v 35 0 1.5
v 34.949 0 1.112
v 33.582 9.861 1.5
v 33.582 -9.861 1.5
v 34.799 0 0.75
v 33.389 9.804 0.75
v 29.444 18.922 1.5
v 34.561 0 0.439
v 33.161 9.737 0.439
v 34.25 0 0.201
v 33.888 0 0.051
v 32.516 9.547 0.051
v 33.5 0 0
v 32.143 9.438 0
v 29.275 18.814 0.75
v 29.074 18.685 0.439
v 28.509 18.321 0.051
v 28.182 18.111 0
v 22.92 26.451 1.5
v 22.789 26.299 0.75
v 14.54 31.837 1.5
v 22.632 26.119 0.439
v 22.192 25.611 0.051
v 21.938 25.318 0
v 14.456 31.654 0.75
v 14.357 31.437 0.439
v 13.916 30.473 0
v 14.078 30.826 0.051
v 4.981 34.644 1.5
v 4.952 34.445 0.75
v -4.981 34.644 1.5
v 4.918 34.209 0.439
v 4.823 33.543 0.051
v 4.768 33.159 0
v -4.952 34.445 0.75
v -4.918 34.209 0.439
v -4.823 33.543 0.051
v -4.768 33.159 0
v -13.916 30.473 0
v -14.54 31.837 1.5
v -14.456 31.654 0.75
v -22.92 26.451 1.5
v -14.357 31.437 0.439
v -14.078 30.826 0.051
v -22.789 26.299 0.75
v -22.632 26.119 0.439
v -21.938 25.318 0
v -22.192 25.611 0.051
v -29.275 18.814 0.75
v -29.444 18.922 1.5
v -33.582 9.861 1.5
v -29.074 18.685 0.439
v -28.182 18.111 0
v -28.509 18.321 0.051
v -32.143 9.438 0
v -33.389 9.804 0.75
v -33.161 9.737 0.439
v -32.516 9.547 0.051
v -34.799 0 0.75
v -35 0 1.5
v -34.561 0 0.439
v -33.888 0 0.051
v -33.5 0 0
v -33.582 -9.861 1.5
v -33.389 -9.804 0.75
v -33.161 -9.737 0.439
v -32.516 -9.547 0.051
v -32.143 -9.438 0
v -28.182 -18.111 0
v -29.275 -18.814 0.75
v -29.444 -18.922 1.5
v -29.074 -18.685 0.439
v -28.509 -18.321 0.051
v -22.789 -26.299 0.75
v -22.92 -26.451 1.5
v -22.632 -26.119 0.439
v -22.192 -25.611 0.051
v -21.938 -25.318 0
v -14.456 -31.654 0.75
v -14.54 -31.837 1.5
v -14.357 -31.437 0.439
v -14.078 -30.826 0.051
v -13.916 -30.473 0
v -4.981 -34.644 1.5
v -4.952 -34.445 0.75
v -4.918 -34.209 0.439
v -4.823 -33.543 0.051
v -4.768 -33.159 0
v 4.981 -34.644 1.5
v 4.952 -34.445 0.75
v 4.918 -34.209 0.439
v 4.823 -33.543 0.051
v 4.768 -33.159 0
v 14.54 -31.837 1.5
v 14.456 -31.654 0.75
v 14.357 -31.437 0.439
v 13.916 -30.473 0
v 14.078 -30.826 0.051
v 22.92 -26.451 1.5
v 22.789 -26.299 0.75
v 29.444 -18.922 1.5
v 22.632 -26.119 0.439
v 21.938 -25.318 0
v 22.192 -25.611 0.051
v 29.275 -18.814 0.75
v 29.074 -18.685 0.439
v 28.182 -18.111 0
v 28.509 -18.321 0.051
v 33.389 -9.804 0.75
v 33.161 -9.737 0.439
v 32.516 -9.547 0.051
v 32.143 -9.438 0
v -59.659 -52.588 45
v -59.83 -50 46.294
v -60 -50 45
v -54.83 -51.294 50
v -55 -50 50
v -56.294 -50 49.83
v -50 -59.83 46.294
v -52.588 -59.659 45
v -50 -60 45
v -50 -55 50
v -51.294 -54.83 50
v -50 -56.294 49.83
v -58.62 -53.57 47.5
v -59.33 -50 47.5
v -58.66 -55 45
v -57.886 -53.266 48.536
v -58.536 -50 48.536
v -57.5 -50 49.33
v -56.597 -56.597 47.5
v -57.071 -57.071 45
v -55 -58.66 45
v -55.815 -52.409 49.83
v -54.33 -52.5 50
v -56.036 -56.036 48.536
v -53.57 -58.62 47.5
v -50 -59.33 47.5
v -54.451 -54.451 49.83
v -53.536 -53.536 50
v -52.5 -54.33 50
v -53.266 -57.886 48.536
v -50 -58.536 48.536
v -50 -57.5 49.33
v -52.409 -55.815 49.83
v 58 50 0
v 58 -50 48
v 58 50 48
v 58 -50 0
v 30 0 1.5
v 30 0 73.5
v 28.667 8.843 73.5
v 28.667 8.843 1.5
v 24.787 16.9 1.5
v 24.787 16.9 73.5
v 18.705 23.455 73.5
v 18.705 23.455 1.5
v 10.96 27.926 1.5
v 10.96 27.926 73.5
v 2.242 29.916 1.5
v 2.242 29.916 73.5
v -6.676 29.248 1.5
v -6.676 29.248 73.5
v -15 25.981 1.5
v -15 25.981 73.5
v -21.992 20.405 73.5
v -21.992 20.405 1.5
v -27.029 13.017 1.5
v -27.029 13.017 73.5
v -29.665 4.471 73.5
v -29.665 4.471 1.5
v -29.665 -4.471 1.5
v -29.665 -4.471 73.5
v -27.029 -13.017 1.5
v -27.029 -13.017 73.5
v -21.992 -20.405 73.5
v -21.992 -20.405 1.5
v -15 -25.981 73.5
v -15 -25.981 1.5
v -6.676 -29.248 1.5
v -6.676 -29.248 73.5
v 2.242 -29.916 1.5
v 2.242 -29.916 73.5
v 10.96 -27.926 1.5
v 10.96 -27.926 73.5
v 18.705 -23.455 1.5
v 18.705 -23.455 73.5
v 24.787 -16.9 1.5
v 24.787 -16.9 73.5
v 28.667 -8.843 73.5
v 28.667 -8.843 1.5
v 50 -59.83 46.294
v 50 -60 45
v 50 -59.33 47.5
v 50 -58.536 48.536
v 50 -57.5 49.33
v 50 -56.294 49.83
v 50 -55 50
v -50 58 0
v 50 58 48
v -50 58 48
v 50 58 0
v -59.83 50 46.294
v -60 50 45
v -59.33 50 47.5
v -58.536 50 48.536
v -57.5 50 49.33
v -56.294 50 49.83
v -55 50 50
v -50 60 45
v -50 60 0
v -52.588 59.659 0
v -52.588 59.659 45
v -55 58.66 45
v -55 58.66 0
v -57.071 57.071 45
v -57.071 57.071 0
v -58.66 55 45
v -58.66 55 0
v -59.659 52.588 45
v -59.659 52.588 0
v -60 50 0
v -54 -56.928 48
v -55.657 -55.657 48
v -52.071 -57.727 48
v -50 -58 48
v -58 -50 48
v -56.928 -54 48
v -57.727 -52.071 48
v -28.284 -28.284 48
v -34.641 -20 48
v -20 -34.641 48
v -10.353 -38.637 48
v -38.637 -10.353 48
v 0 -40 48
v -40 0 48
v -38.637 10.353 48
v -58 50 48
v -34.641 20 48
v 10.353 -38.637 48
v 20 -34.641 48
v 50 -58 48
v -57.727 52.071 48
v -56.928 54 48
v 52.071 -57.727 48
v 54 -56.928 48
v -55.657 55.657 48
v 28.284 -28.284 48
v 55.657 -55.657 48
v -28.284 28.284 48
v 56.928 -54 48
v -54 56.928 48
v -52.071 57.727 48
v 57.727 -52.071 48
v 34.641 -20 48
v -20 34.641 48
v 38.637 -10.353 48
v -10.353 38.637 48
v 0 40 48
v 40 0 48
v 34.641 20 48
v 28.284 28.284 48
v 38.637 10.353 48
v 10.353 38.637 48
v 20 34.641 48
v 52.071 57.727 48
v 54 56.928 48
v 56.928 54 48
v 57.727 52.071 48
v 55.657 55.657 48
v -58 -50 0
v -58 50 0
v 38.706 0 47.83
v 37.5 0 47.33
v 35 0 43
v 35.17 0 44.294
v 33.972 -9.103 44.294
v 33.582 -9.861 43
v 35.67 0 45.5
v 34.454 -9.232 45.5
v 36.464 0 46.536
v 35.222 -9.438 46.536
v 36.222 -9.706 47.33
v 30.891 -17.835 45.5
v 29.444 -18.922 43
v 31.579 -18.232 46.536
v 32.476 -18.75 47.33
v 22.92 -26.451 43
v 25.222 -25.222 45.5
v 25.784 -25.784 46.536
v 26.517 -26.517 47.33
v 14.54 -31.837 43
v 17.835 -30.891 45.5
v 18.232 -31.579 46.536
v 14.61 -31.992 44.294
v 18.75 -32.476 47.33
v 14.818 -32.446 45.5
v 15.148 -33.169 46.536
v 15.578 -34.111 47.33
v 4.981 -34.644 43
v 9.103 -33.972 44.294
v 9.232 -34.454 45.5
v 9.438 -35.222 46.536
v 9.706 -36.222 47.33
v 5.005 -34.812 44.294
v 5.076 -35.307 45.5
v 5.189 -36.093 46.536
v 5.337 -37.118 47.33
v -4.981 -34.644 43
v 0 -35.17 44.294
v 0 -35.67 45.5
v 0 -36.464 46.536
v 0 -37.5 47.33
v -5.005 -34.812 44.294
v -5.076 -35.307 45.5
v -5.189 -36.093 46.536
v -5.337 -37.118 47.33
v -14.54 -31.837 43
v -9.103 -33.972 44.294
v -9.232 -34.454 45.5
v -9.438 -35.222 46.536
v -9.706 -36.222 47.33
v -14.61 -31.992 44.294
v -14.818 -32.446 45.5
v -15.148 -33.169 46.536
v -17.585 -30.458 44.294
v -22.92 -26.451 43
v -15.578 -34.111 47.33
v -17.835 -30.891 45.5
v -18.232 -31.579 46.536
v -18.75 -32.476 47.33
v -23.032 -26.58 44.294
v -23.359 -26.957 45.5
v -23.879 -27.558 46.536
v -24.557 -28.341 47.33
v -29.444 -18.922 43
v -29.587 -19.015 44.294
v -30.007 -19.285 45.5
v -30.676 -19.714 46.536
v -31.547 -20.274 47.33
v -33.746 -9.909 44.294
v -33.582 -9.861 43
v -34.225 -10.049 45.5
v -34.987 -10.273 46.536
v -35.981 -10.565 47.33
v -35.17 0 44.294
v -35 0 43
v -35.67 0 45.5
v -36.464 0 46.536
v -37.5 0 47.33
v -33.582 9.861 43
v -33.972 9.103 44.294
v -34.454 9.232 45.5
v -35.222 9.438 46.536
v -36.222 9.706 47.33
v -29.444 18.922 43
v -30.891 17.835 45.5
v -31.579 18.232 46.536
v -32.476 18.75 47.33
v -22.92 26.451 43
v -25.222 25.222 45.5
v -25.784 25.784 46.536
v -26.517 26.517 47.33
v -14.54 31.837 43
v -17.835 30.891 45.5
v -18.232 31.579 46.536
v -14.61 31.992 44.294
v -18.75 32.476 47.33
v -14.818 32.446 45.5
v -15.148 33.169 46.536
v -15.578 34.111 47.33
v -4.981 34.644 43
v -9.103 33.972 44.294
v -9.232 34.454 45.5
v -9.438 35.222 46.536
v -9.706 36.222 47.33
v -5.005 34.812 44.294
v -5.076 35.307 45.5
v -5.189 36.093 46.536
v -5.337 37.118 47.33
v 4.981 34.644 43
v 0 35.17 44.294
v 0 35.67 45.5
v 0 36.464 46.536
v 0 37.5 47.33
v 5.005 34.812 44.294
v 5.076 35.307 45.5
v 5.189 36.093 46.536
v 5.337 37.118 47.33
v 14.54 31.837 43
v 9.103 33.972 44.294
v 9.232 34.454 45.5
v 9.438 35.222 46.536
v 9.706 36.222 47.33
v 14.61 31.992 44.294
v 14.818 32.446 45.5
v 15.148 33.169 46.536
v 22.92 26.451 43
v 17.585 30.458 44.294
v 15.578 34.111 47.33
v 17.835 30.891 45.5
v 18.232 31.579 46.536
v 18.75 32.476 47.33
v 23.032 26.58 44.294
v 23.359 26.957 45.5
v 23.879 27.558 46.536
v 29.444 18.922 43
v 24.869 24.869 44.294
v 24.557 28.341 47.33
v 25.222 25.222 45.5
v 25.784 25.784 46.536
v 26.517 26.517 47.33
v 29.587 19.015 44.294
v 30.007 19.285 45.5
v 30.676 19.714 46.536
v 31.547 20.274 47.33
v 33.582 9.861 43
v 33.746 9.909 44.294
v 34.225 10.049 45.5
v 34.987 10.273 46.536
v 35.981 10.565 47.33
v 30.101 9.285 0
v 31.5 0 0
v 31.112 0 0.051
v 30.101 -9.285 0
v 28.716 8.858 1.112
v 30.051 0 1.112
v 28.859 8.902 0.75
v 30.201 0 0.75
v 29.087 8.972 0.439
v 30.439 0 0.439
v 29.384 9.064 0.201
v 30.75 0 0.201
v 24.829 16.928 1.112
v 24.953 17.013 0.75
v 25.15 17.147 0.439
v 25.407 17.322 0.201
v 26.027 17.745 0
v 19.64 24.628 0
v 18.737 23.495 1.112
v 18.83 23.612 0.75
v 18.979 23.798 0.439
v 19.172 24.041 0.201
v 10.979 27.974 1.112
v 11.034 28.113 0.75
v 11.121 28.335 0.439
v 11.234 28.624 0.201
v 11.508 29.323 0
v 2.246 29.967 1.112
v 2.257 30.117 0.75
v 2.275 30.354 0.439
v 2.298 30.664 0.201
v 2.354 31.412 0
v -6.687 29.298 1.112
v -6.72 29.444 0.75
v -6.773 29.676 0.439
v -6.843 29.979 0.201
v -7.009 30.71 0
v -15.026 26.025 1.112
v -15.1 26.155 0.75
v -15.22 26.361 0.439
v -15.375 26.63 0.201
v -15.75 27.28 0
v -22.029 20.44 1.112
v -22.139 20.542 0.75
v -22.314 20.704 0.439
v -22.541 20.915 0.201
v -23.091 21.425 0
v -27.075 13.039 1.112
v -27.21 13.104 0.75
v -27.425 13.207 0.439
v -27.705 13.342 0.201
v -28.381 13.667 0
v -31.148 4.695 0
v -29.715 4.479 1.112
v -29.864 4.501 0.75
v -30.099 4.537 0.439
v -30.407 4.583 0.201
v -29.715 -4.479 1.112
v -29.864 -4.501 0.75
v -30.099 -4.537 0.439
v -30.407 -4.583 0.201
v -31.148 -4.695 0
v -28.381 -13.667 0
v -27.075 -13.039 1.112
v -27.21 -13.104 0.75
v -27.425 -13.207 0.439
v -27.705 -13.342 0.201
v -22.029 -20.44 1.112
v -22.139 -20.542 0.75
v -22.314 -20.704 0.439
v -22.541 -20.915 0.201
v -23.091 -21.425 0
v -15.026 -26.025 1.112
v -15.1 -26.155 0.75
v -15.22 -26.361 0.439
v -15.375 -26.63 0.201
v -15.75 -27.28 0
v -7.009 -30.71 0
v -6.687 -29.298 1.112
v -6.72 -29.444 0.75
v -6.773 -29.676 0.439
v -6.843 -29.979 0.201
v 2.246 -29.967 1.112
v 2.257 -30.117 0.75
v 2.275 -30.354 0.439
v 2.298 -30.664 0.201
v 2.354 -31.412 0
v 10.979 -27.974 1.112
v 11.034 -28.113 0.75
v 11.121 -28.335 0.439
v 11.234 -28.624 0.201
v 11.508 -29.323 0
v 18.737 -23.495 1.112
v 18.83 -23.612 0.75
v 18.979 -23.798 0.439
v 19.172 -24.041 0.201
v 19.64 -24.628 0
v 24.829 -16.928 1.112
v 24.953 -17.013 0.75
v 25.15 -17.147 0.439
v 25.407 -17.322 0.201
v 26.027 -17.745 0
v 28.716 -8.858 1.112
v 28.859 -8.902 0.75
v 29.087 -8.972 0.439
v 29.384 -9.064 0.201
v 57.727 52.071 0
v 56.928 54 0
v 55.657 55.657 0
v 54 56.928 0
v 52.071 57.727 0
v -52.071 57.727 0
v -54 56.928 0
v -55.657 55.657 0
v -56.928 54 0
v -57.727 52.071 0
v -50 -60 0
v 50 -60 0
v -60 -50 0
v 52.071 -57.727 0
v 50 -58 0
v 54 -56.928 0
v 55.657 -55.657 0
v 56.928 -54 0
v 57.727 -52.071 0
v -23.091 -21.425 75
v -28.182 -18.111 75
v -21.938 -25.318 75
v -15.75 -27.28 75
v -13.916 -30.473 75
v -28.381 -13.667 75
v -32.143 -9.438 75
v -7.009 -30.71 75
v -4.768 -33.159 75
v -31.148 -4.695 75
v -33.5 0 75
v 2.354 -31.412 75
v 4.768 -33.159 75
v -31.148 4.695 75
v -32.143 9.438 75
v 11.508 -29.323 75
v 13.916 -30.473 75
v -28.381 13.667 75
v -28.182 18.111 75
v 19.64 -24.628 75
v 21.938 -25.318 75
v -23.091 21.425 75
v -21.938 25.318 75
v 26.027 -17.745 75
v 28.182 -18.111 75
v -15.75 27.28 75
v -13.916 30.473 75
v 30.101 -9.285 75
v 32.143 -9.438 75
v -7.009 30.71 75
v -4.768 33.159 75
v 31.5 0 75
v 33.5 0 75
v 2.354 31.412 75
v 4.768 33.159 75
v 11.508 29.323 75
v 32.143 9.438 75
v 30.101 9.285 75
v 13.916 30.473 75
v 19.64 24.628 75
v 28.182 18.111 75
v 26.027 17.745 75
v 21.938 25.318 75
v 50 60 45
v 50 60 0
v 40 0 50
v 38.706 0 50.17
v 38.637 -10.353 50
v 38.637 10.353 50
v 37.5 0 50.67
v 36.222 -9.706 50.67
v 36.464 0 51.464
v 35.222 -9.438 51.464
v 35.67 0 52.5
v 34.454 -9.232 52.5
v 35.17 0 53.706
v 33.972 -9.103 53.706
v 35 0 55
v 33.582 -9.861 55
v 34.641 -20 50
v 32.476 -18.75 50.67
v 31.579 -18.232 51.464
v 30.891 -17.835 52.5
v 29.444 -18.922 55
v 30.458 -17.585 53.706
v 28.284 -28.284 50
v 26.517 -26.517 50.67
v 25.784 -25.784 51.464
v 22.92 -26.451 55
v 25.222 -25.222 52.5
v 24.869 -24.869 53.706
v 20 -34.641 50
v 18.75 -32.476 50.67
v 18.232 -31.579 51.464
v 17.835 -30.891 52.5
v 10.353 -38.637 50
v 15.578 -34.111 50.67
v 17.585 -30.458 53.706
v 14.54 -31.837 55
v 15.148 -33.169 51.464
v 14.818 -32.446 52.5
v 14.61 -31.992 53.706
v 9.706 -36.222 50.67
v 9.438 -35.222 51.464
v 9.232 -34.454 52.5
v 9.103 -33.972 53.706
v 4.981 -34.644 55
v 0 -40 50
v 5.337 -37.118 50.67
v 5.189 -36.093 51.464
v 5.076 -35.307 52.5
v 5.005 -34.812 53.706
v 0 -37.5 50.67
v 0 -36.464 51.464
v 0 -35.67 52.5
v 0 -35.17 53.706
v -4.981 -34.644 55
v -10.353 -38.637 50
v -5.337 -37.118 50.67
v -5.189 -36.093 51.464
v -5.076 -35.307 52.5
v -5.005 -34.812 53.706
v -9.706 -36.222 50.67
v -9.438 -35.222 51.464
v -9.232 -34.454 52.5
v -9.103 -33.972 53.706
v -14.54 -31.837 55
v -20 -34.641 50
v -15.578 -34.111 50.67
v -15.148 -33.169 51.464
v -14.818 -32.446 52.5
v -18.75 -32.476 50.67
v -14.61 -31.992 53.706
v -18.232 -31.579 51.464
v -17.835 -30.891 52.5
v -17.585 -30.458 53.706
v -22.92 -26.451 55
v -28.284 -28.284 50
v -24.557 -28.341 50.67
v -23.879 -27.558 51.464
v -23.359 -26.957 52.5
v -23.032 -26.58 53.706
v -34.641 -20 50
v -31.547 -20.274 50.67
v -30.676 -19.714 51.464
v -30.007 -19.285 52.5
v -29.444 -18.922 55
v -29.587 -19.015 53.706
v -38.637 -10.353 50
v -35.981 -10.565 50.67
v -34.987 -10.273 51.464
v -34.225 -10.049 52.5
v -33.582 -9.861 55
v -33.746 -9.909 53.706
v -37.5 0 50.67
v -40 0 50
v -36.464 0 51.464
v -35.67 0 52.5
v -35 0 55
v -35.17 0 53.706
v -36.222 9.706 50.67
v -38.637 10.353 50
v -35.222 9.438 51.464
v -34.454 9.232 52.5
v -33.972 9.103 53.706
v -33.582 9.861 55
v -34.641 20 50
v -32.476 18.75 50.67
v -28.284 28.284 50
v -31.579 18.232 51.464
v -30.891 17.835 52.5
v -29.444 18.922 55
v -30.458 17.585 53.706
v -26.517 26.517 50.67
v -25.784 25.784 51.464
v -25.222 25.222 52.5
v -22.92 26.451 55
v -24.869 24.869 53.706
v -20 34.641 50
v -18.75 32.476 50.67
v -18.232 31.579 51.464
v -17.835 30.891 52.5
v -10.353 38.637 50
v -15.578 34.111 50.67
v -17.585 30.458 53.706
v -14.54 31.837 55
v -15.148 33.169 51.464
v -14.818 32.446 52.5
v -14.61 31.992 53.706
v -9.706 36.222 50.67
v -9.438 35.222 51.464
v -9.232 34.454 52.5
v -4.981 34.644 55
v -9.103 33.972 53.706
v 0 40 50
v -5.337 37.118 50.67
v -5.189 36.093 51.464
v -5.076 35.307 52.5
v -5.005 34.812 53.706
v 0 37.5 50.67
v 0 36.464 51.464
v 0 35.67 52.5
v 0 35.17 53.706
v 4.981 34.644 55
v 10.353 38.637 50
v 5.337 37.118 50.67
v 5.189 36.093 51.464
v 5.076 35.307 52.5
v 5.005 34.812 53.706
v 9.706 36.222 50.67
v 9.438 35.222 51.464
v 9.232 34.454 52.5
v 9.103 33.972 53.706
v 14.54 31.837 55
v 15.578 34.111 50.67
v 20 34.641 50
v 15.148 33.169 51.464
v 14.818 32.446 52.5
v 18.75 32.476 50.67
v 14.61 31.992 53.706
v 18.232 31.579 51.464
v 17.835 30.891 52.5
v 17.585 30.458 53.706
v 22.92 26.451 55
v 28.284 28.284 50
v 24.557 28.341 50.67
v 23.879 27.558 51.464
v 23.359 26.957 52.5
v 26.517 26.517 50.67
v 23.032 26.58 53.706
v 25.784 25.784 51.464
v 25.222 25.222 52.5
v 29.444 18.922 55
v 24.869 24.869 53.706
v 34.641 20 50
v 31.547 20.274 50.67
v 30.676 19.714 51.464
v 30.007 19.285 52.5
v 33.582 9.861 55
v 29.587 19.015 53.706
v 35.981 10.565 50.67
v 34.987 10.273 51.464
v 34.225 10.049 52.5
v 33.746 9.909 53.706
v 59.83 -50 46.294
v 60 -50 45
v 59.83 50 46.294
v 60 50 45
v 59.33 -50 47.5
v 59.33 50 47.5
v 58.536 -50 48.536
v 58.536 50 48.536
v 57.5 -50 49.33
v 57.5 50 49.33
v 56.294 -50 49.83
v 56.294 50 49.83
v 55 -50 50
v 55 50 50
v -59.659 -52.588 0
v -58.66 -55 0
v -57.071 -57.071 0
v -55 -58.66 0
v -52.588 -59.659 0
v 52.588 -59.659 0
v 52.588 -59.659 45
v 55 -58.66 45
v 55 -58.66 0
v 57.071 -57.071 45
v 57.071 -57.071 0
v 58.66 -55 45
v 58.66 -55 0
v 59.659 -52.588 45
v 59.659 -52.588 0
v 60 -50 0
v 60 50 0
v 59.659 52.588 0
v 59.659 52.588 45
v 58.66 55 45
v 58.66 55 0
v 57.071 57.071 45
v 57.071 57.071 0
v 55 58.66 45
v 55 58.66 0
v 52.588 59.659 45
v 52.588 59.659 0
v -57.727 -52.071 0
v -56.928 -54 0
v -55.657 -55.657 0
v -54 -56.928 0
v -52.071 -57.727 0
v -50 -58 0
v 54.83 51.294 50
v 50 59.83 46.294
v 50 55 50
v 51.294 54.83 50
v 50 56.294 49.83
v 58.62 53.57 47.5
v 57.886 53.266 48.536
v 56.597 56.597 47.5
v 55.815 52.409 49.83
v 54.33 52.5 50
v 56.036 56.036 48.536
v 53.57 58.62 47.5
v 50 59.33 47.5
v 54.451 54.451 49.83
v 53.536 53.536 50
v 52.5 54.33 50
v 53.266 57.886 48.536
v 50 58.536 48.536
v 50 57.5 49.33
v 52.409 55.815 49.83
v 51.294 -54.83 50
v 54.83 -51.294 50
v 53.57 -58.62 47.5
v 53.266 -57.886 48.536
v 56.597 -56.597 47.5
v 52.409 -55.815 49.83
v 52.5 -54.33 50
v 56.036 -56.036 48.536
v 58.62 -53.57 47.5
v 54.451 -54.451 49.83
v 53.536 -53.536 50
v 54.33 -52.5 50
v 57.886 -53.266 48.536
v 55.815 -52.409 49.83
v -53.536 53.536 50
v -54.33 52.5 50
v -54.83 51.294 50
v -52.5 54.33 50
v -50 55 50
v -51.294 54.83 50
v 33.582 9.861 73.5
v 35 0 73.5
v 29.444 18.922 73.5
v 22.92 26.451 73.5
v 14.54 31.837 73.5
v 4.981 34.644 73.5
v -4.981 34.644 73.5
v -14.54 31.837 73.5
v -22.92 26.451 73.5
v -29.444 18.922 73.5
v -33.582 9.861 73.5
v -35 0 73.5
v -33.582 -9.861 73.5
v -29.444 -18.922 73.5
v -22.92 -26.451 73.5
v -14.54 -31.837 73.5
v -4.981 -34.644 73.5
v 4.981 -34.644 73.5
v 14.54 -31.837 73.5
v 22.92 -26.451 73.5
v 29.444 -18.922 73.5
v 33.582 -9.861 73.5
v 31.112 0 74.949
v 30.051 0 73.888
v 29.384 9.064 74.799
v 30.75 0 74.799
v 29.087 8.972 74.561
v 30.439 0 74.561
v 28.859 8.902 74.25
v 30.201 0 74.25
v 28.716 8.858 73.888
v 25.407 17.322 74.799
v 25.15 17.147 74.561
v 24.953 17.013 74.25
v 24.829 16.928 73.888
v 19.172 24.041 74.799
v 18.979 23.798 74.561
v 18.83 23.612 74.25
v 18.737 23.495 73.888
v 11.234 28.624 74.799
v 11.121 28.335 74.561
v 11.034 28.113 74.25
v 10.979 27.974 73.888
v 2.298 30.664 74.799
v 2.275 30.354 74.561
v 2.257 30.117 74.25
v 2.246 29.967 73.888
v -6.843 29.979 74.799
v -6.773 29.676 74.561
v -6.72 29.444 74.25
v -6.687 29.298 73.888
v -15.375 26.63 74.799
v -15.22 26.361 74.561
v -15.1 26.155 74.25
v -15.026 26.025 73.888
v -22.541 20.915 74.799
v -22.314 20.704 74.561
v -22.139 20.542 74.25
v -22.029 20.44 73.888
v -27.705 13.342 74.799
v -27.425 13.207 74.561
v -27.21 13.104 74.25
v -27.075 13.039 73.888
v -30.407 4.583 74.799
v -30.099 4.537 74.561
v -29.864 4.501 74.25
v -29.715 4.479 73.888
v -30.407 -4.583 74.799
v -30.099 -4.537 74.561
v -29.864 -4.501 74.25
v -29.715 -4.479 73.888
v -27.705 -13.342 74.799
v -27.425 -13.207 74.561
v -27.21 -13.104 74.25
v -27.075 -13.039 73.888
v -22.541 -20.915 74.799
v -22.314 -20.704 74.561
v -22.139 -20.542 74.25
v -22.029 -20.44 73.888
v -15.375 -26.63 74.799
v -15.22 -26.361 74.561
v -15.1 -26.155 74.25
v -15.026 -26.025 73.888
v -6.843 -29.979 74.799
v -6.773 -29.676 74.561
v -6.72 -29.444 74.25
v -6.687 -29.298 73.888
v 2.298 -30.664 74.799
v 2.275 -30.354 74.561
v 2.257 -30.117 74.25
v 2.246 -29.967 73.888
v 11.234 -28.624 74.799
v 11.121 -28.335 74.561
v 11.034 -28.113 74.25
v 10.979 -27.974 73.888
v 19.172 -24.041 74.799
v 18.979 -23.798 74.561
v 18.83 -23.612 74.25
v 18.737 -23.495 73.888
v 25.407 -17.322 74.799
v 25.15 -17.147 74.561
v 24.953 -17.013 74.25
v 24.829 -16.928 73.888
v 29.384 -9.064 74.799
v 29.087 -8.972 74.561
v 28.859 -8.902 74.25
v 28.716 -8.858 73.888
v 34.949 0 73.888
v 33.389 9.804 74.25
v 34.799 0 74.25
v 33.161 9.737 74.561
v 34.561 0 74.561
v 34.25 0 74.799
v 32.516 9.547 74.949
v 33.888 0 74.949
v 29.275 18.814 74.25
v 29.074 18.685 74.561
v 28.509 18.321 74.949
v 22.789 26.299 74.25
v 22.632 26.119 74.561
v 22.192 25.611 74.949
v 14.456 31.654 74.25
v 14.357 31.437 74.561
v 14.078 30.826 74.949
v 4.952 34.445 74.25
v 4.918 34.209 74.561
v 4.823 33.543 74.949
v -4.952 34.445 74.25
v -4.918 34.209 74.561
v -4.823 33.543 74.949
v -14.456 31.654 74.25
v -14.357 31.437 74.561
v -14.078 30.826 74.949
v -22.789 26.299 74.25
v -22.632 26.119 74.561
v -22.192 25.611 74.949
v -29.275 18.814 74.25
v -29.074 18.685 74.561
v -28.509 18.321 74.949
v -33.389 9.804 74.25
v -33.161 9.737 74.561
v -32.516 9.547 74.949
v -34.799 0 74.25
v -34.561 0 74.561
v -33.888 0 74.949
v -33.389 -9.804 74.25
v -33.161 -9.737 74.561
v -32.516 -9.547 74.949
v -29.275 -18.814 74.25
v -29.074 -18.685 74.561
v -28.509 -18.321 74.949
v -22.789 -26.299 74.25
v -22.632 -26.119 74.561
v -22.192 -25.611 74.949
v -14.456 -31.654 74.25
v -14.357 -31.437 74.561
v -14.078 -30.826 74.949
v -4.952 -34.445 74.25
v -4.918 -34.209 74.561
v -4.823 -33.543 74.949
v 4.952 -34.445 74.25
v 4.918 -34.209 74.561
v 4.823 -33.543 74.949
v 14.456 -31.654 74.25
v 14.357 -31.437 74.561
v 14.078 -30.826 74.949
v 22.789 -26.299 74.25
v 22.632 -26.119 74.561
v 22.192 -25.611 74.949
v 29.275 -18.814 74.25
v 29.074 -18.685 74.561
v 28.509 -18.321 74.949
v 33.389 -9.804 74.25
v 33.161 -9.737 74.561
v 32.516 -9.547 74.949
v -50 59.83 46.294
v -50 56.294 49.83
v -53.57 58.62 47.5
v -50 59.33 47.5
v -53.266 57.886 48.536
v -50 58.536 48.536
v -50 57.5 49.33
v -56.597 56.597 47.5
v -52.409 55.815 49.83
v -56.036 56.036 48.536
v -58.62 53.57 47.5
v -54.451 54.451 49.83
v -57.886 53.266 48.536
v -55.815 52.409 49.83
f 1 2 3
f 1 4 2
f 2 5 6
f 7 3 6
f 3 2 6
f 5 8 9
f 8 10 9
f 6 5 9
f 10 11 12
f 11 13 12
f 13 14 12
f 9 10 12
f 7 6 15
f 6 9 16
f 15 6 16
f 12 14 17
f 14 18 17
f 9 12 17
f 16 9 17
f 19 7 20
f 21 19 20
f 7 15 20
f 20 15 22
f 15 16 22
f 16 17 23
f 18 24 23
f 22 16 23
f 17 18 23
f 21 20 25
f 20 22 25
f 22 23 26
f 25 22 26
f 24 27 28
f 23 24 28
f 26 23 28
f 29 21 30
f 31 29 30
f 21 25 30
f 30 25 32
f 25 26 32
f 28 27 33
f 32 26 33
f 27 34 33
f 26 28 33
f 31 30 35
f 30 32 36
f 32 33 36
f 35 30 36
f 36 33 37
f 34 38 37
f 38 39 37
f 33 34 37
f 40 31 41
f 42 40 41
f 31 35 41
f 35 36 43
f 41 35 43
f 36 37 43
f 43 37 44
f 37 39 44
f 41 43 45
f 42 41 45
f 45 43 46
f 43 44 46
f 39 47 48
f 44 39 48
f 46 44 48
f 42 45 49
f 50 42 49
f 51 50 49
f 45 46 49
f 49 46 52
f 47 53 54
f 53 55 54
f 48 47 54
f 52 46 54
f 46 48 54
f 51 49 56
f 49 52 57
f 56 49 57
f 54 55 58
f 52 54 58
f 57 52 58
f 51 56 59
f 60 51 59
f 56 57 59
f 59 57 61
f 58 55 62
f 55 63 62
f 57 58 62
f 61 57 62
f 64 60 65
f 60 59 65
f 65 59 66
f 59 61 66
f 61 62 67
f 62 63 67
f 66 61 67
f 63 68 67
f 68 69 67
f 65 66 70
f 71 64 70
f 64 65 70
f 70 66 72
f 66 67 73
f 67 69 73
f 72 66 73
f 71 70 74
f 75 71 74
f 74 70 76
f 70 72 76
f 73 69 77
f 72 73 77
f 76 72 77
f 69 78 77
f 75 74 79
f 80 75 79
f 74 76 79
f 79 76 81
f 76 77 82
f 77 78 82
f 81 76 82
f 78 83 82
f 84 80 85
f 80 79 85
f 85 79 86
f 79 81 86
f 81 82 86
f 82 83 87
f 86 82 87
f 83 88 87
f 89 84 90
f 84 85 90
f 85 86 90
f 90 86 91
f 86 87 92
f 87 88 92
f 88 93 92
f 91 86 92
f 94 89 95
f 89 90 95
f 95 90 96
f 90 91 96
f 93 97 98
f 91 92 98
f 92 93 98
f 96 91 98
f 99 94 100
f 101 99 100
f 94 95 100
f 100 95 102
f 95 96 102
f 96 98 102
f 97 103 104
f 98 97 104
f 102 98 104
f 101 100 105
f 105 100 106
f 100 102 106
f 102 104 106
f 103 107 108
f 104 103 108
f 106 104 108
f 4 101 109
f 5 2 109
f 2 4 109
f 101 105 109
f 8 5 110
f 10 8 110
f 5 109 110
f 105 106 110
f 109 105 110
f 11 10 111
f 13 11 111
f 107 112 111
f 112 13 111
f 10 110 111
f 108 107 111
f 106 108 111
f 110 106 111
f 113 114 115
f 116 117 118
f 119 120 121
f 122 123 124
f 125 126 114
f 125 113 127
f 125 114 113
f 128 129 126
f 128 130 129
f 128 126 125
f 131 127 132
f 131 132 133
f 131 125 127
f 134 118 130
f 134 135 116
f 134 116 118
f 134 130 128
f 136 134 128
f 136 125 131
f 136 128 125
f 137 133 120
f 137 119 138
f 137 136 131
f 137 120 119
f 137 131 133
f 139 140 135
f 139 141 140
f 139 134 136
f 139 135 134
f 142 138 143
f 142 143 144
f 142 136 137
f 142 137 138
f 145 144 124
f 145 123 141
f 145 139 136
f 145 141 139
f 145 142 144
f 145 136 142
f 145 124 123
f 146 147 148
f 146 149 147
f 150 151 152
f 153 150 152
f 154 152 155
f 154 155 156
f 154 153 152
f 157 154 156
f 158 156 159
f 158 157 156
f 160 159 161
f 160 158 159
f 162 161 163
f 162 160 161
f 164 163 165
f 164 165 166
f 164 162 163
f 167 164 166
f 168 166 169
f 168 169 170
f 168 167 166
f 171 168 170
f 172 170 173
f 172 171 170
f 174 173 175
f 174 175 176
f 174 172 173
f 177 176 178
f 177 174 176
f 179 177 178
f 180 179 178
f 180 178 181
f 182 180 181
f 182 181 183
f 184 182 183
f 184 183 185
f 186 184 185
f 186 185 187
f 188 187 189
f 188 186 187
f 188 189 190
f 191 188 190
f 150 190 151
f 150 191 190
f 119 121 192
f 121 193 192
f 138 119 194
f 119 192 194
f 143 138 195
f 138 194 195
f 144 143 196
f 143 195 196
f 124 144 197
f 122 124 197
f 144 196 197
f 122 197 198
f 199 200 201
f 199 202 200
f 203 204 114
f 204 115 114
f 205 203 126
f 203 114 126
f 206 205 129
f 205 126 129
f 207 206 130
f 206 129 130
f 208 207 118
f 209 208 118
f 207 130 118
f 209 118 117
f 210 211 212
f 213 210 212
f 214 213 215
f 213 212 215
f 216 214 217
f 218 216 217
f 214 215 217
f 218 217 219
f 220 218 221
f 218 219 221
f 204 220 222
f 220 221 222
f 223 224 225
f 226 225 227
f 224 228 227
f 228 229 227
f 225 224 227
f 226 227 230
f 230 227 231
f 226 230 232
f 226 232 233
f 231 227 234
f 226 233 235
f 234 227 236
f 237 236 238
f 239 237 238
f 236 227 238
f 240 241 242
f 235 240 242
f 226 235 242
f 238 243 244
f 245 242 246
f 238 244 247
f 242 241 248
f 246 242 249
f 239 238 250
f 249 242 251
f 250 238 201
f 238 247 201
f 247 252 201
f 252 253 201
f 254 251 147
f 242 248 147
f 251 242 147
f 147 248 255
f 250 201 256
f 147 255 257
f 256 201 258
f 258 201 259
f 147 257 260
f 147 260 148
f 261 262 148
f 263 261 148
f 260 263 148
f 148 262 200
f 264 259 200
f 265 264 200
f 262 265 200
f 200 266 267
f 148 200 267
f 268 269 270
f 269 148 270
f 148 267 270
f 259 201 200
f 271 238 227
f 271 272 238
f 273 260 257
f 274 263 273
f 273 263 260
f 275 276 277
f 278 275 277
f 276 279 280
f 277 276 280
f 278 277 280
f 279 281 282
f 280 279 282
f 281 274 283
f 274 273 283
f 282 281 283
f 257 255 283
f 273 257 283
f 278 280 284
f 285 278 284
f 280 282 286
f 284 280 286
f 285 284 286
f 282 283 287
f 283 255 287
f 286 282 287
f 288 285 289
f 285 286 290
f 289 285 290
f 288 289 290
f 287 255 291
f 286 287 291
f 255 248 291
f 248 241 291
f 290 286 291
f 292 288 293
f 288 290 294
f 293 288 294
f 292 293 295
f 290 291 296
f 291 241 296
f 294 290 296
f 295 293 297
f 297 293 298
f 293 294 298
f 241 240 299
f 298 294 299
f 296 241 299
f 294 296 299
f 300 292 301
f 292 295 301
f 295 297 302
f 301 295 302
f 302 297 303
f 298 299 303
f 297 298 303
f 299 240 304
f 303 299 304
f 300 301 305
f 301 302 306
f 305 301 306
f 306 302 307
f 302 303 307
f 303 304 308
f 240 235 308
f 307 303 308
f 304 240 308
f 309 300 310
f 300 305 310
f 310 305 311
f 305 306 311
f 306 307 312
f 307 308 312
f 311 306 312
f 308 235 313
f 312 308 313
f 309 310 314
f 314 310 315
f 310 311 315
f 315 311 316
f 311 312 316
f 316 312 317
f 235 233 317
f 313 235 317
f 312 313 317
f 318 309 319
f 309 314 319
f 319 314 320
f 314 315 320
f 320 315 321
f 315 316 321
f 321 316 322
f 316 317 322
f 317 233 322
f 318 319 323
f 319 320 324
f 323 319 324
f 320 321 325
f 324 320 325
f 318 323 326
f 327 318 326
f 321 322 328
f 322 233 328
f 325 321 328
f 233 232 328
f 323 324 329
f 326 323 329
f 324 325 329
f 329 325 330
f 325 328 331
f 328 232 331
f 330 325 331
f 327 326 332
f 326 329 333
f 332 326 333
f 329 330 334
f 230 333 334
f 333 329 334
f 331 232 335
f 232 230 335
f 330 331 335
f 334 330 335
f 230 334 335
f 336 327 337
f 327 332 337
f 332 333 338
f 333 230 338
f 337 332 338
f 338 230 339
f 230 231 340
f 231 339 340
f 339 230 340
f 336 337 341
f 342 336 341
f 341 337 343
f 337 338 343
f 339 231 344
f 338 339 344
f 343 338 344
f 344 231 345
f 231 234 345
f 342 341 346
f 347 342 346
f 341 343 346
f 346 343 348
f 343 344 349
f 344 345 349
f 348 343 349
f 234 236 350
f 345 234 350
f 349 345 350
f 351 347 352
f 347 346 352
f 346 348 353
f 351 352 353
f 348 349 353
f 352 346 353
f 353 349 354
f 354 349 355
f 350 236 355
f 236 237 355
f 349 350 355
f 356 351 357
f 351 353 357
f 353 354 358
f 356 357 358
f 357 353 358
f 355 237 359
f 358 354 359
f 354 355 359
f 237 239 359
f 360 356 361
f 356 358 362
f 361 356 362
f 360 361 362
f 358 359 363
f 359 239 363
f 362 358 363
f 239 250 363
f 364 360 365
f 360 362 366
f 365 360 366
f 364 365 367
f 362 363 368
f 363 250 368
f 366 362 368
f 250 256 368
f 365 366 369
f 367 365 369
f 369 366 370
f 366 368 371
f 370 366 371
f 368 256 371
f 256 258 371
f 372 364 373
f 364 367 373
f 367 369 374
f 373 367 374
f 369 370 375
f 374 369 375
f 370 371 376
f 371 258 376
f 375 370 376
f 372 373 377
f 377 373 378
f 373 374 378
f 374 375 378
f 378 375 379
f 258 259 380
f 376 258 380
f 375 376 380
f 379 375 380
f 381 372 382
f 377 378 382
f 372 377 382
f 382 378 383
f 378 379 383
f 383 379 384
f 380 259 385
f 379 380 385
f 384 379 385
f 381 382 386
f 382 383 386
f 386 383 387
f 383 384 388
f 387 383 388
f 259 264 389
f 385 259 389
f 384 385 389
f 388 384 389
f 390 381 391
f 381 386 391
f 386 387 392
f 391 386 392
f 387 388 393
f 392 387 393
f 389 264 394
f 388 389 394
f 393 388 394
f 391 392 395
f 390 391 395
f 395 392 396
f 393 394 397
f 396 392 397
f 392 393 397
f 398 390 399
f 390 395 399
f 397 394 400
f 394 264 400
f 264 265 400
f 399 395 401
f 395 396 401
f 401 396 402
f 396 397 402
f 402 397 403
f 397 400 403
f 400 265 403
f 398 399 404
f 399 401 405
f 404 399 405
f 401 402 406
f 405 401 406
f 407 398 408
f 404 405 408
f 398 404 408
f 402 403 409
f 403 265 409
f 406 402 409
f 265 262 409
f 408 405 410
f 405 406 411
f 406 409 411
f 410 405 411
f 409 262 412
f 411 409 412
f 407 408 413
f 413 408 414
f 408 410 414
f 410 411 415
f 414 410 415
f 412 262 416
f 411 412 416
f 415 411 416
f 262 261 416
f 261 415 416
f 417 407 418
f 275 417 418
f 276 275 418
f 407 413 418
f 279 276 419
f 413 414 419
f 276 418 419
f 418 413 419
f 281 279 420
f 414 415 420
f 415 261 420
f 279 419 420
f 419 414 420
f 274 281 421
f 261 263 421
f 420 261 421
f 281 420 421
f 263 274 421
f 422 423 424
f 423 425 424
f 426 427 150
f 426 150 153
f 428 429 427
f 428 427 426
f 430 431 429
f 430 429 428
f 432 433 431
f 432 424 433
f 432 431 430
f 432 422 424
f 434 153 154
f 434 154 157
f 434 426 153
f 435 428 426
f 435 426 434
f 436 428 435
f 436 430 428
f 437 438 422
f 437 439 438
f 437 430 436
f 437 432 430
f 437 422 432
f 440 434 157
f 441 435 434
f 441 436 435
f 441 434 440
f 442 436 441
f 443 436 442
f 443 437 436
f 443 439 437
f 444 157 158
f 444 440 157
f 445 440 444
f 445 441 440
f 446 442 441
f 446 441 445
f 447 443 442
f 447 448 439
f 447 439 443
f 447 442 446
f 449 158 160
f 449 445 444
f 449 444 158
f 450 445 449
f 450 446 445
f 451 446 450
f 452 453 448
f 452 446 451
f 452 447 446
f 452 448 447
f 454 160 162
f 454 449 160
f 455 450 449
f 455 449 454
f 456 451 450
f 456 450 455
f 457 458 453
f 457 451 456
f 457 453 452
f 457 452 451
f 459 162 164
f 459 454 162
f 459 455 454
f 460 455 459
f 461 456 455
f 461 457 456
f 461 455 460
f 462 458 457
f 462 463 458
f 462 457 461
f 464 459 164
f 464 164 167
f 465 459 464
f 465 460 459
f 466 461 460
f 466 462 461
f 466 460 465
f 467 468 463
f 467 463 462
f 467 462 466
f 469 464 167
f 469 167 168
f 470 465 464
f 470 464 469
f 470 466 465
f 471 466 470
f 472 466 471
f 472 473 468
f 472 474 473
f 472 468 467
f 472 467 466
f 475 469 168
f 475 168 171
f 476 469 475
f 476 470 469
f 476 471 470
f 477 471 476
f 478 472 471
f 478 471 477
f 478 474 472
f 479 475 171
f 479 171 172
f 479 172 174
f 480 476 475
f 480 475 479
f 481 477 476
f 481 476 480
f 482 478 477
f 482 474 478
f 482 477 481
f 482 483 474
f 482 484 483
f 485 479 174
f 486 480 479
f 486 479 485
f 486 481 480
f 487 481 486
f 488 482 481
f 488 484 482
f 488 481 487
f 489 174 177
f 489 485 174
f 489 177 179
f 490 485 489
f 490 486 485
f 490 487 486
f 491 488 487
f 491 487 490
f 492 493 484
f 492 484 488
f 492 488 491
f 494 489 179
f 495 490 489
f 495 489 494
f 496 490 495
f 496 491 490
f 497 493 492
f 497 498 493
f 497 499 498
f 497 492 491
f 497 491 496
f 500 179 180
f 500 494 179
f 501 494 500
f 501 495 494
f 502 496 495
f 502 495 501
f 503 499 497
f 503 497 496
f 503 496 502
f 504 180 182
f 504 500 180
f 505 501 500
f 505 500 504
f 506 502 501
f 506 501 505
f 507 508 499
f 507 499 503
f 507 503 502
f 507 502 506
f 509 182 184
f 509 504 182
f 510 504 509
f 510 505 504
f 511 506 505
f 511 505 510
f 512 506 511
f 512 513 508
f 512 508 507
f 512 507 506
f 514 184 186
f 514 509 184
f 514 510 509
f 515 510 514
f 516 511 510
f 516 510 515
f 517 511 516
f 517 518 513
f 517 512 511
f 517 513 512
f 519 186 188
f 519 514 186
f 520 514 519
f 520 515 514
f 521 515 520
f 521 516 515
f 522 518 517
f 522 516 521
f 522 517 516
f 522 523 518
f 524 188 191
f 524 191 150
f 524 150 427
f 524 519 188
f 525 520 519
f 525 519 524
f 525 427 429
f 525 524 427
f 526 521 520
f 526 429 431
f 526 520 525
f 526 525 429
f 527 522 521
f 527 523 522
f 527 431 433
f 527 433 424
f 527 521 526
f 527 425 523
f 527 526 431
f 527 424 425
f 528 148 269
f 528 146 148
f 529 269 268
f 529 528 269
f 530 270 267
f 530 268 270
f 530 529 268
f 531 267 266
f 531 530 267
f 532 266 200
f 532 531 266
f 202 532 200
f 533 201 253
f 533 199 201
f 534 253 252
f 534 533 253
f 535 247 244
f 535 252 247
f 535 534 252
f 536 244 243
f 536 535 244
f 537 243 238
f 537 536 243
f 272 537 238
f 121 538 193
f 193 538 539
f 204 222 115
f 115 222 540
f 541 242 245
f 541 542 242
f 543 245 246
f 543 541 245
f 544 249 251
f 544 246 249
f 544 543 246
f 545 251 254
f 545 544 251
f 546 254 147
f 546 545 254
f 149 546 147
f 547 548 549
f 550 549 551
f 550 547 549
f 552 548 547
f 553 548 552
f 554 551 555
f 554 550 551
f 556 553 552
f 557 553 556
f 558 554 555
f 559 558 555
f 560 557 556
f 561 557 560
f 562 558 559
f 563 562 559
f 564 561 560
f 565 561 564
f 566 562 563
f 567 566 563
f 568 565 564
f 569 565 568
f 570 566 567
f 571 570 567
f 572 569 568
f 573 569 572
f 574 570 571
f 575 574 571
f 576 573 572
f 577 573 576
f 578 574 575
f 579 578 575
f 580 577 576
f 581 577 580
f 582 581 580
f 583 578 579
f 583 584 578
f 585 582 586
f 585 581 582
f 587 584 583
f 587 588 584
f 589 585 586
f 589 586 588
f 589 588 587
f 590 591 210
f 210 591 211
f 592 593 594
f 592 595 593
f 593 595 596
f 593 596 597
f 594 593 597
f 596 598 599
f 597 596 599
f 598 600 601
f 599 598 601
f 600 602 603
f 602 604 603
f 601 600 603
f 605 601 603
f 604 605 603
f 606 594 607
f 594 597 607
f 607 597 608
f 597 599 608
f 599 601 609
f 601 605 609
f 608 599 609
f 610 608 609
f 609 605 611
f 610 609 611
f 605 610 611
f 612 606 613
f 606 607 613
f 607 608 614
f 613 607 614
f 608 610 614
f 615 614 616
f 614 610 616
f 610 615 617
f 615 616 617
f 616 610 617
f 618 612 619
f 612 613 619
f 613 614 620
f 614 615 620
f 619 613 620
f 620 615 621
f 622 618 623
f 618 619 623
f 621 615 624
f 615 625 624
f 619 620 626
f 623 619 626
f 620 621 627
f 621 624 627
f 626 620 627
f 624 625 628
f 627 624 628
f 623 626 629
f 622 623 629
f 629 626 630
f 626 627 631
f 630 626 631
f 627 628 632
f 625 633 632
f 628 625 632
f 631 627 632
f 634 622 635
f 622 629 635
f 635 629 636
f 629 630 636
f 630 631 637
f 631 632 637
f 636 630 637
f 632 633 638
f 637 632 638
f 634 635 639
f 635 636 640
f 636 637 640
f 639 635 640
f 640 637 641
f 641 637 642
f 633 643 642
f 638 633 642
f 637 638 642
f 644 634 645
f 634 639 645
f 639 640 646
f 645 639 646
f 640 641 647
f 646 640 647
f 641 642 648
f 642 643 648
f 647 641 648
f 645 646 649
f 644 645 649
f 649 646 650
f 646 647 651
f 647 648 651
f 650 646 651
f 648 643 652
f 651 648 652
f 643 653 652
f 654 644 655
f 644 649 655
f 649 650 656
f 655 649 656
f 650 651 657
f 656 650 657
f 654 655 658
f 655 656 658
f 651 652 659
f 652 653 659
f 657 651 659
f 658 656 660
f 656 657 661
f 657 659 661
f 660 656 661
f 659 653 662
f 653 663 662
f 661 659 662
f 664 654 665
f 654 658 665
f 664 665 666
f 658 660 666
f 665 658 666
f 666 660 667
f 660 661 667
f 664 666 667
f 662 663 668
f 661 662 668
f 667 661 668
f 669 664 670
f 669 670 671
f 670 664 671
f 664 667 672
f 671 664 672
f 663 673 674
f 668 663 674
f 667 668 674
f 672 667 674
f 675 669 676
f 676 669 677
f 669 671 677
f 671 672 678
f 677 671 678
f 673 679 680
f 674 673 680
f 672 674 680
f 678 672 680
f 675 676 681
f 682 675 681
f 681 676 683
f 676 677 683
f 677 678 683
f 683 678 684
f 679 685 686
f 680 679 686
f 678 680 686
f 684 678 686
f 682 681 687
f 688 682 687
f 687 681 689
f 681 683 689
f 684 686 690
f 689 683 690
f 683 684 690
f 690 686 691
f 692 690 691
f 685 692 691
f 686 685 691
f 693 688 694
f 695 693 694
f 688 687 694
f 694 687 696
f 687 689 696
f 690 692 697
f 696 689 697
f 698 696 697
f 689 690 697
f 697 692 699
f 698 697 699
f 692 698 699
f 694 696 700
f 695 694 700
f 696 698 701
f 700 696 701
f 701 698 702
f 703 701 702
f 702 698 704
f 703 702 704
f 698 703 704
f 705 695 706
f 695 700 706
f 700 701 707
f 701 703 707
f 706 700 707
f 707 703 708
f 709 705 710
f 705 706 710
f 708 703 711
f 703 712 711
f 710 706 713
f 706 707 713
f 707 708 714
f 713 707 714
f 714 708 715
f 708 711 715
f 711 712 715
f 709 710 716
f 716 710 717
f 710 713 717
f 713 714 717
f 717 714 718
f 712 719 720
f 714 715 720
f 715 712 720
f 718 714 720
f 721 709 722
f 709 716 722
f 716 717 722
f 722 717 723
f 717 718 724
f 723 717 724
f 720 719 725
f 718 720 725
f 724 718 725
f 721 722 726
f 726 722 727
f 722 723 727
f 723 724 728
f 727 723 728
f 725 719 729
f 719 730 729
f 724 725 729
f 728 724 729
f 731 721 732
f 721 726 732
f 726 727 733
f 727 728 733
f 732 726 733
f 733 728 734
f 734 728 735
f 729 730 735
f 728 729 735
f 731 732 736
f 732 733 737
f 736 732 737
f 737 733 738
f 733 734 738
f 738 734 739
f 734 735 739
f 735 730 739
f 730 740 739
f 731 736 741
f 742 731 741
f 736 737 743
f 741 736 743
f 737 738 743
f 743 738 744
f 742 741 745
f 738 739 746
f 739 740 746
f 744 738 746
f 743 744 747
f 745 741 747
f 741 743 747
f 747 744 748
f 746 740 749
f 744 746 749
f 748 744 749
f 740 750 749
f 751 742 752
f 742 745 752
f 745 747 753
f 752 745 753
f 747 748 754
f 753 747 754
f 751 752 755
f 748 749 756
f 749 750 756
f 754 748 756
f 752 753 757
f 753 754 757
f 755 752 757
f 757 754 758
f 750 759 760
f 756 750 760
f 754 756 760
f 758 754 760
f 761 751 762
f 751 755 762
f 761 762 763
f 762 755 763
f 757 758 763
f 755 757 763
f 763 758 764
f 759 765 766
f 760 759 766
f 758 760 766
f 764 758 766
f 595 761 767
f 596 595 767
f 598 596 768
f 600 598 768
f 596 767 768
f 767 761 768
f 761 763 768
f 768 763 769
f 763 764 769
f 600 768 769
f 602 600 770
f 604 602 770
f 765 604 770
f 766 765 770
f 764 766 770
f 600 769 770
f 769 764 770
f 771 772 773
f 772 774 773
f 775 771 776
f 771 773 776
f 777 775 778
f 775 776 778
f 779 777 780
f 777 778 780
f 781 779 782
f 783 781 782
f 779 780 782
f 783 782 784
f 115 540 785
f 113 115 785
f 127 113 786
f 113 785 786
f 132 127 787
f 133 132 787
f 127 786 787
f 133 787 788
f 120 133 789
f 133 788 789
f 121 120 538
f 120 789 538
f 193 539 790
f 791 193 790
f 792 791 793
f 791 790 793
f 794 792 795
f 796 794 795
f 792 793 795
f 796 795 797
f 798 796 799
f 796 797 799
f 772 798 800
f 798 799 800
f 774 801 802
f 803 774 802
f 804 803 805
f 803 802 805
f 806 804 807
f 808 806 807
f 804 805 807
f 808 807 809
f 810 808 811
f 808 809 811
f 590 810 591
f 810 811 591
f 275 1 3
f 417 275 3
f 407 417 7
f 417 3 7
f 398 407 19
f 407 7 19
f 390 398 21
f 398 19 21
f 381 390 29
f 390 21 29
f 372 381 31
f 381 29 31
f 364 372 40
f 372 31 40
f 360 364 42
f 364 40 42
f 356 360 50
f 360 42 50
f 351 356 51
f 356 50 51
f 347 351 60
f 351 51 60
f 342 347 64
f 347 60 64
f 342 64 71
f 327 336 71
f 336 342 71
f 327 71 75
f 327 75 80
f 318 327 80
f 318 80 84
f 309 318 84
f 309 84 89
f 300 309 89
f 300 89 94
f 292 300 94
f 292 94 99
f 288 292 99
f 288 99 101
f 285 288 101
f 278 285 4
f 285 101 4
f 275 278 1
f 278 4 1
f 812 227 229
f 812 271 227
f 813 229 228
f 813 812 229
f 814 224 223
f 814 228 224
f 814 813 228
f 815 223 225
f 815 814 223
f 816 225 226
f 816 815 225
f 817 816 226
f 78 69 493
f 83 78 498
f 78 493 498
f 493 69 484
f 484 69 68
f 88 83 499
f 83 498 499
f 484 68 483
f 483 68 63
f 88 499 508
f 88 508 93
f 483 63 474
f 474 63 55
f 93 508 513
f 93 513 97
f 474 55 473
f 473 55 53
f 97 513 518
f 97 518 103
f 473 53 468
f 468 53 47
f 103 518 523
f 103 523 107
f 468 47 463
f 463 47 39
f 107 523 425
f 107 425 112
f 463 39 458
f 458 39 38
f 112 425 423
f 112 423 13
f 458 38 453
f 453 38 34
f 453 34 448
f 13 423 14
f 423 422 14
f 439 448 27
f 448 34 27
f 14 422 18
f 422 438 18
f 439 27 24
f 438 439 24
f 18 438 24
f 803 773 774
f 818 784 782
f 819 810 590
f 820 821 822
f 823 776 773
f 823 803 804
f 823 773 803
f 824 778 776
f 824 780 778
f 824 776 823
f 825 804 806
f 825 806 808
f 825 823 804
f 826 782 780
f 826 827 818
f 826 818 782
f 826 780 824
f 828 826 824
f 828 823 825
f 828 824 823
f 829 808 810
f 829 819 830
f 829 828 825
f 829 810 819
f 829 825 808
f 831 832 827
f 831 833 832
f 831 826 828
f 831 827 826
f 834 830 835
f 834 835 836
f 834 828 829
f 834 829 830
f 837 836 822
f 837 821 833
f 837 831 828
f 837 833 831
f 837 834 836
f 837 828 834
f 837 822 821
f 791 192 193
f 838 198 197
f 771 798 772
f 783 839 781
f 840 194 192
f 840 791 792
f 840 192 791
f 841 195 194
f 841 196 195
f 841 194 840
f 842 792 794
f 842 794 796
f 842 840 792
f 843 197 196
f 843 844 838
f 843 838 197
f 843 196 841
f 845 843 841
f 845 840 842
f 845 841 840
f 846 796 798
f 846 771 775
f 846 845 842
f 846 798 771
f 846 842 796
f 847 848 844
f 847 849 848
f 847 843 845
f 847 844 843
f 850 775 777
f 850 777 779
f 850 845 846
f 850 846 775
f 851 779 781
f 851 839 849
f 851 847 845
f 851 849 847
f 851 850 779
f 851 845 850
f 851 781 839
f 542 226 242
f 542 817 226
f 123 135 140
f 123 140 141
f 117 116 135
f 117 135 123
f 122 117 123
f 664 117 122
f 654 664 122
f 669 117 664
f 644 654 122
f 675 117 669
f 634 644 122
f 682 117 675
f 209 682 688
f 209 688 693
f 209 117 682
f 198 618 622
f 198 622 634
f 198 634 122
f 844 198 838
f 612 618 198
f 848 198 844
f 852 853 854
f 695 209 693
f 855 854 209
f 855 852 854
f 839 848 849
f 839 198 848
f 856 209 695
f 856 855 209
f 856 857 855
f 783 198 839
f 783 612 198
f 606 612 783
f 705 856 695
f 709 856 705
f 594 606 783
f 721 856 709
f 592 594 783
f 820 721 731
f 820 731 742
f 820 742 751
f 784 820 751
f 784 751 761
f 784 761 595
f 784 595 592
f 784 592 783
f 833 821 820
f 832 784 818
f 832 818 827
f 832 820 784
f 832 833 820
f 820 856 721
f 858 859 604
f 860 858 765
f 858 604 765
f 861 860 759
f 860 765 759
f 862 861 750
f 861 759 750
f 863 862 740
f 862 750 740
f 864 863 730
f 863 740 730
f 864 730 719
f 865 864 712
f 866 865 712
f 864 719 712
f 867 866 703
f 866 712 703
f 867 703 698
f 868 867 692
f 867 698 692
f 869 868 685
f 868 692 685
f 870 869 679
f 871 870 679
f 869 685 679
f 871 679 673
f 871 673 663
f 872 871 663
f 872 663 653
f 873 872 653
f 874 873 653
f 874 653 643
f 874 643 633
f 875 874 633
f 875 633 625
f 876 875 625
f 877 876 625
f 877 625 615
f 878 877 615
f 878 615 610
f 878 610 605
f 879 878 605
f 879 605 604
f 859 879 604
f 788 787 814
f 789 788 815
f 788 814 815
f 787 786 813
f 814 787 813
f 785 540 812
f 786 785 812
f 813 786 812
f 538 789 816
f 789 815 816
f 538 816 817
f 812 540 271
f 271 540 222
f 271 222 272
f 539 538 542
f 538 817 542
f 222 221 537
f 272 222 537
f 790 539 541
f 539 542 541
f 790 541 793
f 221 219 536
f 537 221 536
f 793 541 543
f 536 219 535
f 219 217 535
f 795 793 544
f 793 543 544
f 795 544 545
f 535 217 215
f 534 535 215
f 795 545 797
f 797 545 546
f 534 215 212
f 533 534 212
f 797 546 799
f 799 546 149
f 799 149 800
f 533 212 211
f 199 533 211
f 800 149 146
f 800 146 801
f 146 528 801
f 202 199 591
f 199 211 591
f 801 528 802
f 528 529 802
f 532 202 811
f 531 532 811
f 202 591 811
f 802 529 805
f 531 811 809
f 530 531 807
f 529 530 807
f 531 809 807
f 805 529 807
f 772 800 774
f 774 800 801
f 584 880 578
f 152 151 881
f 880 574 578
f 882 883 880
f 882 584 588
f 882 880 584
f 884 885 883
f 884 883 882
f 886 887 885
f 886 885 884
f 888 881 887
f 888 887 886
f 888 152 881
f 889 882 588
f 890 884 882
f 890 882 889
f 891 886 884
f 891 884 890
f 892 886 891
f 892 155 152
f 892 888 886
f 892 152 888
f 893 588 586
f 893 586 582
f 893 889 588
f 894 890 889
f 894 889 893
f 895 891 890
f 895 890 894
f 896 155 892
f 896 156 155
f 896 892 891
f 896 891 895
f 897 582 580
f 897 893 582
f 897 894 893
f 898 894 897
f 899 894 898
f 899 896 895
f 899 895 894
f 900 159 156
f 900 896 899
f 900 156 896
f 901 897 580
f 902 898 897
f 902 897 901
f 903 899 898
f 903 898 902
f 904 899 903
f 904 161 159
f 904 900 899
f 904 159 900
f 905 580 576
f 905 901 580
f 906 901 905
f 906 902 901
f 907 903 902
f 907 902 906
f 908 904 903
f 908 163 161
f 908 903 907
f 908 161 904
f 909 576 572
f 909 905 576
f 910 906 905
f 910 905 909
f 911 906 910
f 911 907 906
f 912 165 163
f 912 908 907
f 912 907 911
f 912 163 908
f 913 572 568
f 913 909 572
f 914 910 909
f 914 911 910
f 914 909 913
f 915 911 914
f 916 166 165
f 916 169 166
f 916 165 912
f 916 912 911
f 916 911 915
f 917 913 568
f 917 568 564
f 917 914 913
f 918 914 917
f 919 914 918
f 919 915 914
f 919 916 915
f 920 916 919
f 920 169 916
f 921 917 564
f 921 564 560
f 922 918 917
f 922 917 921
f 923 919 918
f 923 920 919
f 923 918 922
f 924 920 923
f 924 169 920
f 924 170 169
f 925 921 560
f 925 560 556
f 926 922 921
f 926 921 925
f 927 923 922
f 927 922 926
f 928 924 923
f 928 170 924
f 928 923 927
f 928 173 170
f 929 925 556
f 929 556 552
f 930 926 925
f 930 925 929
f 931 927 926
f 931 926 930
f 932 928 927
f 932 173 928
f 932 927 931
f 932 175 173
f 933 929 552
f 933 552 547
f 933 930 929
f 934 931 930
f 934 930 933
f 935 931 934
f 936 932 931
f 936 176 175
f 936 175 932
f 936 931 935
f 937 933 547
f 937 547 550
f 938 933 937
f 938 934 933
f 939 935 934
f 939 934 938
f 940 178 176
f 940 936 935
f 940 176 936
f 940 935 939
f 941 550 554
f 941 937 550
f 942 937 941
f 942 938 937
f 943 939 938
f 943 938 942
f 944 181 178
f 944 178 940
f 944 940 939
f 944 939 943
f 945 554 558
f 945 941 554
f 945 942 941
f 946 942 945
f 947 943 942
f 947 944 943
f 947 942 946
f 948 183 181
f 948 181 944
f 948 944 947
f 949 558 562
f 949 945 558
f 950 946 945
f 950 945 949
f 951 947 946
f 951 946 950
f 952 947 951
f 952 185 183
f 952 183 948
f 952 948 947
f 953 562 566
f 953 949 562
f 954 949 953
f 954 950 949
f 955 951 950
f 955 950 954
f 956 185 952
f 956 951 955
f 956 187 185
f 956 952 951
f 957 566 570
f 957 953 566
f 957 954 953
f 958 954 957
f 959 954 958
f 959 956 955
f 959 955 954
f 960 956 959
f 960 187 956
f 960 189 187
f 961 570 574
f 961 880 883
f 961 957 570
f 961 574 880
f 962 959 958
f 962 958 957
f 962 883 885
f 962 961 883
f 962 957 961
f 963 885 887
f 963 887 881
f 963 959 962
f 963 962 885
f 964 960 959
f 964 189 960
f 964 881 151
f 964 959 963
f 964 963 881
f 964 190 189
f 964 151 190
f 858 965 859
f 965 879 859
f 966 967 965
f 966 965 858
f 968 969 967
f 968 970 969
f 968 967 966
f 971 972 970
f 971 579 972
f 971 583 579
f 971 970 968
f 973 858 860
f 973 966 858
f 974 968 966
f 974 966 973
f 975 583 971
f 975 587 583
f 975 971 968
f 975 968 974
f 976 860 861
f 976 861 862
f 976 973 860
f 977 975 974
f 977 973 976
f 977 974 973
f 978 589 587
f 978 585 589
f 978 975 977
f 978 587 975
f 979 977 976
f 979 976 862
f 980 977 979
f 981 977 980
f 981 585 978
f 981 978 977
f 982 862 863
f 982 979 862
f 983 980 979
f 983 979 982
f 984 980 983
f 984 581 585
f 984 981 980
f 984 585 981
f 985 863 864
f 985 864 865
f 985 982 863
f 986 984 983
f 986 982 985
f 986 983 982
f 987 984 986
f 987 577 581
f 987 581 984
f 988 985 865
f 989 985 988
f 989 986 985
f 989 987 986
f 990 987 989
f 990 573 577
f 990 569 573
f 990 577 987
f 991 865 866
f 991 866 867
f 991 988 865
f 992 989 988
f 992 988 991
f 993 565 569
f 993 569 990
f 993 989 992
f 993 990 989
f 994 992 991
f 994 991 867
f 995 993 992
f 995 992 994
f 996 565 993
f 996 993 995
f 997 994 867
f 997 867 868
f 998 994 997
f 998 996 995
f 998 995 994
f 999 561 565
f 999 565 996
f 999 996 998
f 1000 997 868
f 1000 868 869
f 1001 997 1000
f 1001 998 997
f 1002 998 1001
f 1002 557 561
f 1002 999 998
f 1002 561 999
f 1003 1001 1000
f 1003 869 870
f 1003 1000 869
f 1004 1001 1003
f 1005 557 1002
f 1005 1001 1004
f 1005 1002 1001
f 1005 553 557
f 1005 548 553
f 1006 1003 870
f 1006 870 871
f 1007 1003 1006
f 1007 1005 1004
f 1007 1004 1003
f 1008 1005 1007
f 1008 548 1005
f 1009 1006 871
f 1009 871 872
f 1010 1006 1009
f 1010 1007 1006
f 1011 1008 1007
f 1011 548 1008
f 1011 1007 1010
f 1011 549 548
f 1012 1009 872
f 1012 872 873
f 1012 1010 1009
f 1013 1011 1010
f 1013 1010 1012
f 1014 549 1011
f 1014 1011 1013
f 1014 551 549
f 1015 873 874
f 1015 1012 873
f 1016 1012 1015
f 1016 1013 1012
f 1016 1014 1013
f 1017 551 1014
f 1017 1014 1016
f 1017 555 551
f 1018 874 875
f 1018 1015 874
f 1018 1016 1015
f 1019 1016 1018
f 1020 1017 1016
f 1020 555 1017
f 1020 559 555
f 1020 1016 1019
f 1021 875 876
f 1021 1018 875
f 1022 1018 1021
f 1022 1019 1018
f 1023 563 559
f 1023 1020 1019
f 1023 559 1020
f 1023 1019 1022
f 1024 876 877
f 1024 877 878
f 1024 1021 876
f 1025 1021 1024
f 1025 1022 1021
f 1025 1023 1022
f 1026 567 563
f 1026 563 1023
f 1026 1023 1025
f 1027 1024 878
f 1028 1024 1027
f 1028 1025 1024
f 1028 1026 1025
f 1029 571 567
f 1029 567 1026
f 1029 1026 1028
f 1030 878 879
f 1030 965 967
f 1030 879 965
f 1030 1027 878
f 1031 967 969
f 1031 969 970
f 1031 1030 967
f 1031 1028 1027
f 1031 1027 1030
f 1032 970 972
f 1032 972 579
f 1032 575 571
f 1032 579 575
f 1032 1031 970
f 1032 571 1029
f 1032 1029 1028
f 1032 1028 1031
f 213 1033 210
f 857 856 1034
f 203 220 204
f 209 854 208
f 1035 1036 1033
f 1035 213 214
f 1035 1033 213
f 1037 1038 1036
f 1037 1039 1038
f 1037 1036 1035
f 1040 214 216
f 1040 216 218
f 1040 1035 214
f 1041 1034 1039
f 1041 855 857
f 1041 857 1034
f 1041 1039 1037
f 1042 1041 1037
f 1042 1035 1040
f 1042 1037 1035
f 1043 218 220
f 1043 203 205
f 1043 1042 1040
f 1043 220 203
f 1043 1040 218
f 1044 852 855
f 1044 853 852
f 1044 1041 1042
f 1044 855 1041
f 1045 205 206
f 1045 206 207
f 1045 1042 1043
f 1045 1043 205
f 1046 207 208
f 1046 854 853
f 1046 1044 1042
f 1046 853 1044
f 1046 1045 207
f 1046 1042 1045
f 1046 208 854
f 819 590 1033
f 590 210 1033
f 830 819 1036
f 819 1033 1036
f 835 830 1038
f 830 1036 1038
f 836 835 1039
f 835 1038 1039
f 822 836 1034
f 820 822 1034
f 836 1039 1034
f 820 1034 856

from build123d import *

# Parameters (mm, degrees)
SALIENTE_EXTRUIR1_DEPTH      = 50
VACIADO2_T                   = -2
SALIENTE_EXTRUIR3_DEPTH      = 25
SALIENTE_EXTRUIR3_DEPTH_BACK = 50
CROQUIS2_R                   = 35
CROQUIS2_R_2                 = 30
CROQUIS3_R                   = 30
CORTAR_EXTRUIR1_DEPTH        = 114.247516529
REDONDEO1_R                  = 1.5
REDONDEO2_R                  = 5
REDONDEO3_R                  = 5


with BuildPart() as part:
    # Croquis1 → Saliente-Extruir1 (new body)
    with BuildSketch(Plane.XY):
        with BuildLine():
            Line((-50, -60), (50, -60))
            ThreePointArc((50, -60), (57.071067812, -57.071067812), (60, -50))
            Line((60, -50), (60, 50))
            ThreePointArc((60, 50), (57.071067812, 57.071067812), (50, 60))
            Line((50, 60), (-50, 60))
            ThreePointArc((-50, 60), (-57.071067812, 57.071067812), (-60, 50))
            Line((-60, 50), (-60, -50))
            ThreePointArc((-60, -50), (-57.071067812, -57.071067812), (-50, -60))
        make_face()
    extrude(amount=SALIENTE_EXTRUIR1_DEPTH)

    # Vaciado2
    vaciado2_openings = [part.faces().sort_by_distance(p)[0] for p in [
        (0, 0, 0),
    ]]
    offset(amount=VACIADO2_T, openings=vaciado2_openings, kind=Kind.INTERSECTION)

    # Croquis2 → Saliente-Extruir3 (add, two sides: drawn at the far end of the back side and taken through both)
    with BuildSketch(Plane.XY.offset(50).offset(-SALIENTE_EXTRUIR3_DEPTH_BACK)):
        Circle(CROQUIS2_R)
        Circle(CROQUIS2_R_2, mode=Mode.SUBTRACT)
    extrude(amount=SALIENTE_EXTRUIR3_DEPTH + SALIENTE_EXTRUIR3_DEPTH_BACK)

    # Croquis3 → Cortar-Extruir1 (cut, through all)
    with BuildSketch(Plane.XY.offset(75)):
        Circle(CROQUIS3_R)
    extrude(amount=-CORTAR_EXTRUIR1_DEPTH, mode=Mode.SUBTRACT)

    # Redondeo1
    redondeo1_edges = [part.edges().sort_by_distance(p)[0] for p in [
        (-30, 0, 75),
        (-35, 0, 0),
        (-30, 0, 0),
        (-35, 0, 75),
    ]]
    fillet(redondeo1_edges, radius=REDONDEO1_R)

    # Redondeo2
    redondeo2_edges = [part.edges().sort_by_distance(p)[0] for p in [
        (-35, 0, 48),
        (-35, 0, 50),
    ]]
    fillet(redondeo2_edges, radius=REDONDEO2_R)

    # Redondeo3
    redondeo3_edges = [part.edges().sort_by_distance(p)[0] for p in [
        (57.071067812, -57.071067812, 50),
        (60, 0, 50),
        (57.071067812, 57.071067812, 50),
        (0, 60, 50),
        (-57.071067812, 57.071067812, 50),
        (-60, 0, 50),
        (-57.071067812, -57.071067812, 50),
        (0, -60, 50),
    ]]
    fillet(redondeo3_edges, radius=REDONDEO3_R)


solid = part.part
